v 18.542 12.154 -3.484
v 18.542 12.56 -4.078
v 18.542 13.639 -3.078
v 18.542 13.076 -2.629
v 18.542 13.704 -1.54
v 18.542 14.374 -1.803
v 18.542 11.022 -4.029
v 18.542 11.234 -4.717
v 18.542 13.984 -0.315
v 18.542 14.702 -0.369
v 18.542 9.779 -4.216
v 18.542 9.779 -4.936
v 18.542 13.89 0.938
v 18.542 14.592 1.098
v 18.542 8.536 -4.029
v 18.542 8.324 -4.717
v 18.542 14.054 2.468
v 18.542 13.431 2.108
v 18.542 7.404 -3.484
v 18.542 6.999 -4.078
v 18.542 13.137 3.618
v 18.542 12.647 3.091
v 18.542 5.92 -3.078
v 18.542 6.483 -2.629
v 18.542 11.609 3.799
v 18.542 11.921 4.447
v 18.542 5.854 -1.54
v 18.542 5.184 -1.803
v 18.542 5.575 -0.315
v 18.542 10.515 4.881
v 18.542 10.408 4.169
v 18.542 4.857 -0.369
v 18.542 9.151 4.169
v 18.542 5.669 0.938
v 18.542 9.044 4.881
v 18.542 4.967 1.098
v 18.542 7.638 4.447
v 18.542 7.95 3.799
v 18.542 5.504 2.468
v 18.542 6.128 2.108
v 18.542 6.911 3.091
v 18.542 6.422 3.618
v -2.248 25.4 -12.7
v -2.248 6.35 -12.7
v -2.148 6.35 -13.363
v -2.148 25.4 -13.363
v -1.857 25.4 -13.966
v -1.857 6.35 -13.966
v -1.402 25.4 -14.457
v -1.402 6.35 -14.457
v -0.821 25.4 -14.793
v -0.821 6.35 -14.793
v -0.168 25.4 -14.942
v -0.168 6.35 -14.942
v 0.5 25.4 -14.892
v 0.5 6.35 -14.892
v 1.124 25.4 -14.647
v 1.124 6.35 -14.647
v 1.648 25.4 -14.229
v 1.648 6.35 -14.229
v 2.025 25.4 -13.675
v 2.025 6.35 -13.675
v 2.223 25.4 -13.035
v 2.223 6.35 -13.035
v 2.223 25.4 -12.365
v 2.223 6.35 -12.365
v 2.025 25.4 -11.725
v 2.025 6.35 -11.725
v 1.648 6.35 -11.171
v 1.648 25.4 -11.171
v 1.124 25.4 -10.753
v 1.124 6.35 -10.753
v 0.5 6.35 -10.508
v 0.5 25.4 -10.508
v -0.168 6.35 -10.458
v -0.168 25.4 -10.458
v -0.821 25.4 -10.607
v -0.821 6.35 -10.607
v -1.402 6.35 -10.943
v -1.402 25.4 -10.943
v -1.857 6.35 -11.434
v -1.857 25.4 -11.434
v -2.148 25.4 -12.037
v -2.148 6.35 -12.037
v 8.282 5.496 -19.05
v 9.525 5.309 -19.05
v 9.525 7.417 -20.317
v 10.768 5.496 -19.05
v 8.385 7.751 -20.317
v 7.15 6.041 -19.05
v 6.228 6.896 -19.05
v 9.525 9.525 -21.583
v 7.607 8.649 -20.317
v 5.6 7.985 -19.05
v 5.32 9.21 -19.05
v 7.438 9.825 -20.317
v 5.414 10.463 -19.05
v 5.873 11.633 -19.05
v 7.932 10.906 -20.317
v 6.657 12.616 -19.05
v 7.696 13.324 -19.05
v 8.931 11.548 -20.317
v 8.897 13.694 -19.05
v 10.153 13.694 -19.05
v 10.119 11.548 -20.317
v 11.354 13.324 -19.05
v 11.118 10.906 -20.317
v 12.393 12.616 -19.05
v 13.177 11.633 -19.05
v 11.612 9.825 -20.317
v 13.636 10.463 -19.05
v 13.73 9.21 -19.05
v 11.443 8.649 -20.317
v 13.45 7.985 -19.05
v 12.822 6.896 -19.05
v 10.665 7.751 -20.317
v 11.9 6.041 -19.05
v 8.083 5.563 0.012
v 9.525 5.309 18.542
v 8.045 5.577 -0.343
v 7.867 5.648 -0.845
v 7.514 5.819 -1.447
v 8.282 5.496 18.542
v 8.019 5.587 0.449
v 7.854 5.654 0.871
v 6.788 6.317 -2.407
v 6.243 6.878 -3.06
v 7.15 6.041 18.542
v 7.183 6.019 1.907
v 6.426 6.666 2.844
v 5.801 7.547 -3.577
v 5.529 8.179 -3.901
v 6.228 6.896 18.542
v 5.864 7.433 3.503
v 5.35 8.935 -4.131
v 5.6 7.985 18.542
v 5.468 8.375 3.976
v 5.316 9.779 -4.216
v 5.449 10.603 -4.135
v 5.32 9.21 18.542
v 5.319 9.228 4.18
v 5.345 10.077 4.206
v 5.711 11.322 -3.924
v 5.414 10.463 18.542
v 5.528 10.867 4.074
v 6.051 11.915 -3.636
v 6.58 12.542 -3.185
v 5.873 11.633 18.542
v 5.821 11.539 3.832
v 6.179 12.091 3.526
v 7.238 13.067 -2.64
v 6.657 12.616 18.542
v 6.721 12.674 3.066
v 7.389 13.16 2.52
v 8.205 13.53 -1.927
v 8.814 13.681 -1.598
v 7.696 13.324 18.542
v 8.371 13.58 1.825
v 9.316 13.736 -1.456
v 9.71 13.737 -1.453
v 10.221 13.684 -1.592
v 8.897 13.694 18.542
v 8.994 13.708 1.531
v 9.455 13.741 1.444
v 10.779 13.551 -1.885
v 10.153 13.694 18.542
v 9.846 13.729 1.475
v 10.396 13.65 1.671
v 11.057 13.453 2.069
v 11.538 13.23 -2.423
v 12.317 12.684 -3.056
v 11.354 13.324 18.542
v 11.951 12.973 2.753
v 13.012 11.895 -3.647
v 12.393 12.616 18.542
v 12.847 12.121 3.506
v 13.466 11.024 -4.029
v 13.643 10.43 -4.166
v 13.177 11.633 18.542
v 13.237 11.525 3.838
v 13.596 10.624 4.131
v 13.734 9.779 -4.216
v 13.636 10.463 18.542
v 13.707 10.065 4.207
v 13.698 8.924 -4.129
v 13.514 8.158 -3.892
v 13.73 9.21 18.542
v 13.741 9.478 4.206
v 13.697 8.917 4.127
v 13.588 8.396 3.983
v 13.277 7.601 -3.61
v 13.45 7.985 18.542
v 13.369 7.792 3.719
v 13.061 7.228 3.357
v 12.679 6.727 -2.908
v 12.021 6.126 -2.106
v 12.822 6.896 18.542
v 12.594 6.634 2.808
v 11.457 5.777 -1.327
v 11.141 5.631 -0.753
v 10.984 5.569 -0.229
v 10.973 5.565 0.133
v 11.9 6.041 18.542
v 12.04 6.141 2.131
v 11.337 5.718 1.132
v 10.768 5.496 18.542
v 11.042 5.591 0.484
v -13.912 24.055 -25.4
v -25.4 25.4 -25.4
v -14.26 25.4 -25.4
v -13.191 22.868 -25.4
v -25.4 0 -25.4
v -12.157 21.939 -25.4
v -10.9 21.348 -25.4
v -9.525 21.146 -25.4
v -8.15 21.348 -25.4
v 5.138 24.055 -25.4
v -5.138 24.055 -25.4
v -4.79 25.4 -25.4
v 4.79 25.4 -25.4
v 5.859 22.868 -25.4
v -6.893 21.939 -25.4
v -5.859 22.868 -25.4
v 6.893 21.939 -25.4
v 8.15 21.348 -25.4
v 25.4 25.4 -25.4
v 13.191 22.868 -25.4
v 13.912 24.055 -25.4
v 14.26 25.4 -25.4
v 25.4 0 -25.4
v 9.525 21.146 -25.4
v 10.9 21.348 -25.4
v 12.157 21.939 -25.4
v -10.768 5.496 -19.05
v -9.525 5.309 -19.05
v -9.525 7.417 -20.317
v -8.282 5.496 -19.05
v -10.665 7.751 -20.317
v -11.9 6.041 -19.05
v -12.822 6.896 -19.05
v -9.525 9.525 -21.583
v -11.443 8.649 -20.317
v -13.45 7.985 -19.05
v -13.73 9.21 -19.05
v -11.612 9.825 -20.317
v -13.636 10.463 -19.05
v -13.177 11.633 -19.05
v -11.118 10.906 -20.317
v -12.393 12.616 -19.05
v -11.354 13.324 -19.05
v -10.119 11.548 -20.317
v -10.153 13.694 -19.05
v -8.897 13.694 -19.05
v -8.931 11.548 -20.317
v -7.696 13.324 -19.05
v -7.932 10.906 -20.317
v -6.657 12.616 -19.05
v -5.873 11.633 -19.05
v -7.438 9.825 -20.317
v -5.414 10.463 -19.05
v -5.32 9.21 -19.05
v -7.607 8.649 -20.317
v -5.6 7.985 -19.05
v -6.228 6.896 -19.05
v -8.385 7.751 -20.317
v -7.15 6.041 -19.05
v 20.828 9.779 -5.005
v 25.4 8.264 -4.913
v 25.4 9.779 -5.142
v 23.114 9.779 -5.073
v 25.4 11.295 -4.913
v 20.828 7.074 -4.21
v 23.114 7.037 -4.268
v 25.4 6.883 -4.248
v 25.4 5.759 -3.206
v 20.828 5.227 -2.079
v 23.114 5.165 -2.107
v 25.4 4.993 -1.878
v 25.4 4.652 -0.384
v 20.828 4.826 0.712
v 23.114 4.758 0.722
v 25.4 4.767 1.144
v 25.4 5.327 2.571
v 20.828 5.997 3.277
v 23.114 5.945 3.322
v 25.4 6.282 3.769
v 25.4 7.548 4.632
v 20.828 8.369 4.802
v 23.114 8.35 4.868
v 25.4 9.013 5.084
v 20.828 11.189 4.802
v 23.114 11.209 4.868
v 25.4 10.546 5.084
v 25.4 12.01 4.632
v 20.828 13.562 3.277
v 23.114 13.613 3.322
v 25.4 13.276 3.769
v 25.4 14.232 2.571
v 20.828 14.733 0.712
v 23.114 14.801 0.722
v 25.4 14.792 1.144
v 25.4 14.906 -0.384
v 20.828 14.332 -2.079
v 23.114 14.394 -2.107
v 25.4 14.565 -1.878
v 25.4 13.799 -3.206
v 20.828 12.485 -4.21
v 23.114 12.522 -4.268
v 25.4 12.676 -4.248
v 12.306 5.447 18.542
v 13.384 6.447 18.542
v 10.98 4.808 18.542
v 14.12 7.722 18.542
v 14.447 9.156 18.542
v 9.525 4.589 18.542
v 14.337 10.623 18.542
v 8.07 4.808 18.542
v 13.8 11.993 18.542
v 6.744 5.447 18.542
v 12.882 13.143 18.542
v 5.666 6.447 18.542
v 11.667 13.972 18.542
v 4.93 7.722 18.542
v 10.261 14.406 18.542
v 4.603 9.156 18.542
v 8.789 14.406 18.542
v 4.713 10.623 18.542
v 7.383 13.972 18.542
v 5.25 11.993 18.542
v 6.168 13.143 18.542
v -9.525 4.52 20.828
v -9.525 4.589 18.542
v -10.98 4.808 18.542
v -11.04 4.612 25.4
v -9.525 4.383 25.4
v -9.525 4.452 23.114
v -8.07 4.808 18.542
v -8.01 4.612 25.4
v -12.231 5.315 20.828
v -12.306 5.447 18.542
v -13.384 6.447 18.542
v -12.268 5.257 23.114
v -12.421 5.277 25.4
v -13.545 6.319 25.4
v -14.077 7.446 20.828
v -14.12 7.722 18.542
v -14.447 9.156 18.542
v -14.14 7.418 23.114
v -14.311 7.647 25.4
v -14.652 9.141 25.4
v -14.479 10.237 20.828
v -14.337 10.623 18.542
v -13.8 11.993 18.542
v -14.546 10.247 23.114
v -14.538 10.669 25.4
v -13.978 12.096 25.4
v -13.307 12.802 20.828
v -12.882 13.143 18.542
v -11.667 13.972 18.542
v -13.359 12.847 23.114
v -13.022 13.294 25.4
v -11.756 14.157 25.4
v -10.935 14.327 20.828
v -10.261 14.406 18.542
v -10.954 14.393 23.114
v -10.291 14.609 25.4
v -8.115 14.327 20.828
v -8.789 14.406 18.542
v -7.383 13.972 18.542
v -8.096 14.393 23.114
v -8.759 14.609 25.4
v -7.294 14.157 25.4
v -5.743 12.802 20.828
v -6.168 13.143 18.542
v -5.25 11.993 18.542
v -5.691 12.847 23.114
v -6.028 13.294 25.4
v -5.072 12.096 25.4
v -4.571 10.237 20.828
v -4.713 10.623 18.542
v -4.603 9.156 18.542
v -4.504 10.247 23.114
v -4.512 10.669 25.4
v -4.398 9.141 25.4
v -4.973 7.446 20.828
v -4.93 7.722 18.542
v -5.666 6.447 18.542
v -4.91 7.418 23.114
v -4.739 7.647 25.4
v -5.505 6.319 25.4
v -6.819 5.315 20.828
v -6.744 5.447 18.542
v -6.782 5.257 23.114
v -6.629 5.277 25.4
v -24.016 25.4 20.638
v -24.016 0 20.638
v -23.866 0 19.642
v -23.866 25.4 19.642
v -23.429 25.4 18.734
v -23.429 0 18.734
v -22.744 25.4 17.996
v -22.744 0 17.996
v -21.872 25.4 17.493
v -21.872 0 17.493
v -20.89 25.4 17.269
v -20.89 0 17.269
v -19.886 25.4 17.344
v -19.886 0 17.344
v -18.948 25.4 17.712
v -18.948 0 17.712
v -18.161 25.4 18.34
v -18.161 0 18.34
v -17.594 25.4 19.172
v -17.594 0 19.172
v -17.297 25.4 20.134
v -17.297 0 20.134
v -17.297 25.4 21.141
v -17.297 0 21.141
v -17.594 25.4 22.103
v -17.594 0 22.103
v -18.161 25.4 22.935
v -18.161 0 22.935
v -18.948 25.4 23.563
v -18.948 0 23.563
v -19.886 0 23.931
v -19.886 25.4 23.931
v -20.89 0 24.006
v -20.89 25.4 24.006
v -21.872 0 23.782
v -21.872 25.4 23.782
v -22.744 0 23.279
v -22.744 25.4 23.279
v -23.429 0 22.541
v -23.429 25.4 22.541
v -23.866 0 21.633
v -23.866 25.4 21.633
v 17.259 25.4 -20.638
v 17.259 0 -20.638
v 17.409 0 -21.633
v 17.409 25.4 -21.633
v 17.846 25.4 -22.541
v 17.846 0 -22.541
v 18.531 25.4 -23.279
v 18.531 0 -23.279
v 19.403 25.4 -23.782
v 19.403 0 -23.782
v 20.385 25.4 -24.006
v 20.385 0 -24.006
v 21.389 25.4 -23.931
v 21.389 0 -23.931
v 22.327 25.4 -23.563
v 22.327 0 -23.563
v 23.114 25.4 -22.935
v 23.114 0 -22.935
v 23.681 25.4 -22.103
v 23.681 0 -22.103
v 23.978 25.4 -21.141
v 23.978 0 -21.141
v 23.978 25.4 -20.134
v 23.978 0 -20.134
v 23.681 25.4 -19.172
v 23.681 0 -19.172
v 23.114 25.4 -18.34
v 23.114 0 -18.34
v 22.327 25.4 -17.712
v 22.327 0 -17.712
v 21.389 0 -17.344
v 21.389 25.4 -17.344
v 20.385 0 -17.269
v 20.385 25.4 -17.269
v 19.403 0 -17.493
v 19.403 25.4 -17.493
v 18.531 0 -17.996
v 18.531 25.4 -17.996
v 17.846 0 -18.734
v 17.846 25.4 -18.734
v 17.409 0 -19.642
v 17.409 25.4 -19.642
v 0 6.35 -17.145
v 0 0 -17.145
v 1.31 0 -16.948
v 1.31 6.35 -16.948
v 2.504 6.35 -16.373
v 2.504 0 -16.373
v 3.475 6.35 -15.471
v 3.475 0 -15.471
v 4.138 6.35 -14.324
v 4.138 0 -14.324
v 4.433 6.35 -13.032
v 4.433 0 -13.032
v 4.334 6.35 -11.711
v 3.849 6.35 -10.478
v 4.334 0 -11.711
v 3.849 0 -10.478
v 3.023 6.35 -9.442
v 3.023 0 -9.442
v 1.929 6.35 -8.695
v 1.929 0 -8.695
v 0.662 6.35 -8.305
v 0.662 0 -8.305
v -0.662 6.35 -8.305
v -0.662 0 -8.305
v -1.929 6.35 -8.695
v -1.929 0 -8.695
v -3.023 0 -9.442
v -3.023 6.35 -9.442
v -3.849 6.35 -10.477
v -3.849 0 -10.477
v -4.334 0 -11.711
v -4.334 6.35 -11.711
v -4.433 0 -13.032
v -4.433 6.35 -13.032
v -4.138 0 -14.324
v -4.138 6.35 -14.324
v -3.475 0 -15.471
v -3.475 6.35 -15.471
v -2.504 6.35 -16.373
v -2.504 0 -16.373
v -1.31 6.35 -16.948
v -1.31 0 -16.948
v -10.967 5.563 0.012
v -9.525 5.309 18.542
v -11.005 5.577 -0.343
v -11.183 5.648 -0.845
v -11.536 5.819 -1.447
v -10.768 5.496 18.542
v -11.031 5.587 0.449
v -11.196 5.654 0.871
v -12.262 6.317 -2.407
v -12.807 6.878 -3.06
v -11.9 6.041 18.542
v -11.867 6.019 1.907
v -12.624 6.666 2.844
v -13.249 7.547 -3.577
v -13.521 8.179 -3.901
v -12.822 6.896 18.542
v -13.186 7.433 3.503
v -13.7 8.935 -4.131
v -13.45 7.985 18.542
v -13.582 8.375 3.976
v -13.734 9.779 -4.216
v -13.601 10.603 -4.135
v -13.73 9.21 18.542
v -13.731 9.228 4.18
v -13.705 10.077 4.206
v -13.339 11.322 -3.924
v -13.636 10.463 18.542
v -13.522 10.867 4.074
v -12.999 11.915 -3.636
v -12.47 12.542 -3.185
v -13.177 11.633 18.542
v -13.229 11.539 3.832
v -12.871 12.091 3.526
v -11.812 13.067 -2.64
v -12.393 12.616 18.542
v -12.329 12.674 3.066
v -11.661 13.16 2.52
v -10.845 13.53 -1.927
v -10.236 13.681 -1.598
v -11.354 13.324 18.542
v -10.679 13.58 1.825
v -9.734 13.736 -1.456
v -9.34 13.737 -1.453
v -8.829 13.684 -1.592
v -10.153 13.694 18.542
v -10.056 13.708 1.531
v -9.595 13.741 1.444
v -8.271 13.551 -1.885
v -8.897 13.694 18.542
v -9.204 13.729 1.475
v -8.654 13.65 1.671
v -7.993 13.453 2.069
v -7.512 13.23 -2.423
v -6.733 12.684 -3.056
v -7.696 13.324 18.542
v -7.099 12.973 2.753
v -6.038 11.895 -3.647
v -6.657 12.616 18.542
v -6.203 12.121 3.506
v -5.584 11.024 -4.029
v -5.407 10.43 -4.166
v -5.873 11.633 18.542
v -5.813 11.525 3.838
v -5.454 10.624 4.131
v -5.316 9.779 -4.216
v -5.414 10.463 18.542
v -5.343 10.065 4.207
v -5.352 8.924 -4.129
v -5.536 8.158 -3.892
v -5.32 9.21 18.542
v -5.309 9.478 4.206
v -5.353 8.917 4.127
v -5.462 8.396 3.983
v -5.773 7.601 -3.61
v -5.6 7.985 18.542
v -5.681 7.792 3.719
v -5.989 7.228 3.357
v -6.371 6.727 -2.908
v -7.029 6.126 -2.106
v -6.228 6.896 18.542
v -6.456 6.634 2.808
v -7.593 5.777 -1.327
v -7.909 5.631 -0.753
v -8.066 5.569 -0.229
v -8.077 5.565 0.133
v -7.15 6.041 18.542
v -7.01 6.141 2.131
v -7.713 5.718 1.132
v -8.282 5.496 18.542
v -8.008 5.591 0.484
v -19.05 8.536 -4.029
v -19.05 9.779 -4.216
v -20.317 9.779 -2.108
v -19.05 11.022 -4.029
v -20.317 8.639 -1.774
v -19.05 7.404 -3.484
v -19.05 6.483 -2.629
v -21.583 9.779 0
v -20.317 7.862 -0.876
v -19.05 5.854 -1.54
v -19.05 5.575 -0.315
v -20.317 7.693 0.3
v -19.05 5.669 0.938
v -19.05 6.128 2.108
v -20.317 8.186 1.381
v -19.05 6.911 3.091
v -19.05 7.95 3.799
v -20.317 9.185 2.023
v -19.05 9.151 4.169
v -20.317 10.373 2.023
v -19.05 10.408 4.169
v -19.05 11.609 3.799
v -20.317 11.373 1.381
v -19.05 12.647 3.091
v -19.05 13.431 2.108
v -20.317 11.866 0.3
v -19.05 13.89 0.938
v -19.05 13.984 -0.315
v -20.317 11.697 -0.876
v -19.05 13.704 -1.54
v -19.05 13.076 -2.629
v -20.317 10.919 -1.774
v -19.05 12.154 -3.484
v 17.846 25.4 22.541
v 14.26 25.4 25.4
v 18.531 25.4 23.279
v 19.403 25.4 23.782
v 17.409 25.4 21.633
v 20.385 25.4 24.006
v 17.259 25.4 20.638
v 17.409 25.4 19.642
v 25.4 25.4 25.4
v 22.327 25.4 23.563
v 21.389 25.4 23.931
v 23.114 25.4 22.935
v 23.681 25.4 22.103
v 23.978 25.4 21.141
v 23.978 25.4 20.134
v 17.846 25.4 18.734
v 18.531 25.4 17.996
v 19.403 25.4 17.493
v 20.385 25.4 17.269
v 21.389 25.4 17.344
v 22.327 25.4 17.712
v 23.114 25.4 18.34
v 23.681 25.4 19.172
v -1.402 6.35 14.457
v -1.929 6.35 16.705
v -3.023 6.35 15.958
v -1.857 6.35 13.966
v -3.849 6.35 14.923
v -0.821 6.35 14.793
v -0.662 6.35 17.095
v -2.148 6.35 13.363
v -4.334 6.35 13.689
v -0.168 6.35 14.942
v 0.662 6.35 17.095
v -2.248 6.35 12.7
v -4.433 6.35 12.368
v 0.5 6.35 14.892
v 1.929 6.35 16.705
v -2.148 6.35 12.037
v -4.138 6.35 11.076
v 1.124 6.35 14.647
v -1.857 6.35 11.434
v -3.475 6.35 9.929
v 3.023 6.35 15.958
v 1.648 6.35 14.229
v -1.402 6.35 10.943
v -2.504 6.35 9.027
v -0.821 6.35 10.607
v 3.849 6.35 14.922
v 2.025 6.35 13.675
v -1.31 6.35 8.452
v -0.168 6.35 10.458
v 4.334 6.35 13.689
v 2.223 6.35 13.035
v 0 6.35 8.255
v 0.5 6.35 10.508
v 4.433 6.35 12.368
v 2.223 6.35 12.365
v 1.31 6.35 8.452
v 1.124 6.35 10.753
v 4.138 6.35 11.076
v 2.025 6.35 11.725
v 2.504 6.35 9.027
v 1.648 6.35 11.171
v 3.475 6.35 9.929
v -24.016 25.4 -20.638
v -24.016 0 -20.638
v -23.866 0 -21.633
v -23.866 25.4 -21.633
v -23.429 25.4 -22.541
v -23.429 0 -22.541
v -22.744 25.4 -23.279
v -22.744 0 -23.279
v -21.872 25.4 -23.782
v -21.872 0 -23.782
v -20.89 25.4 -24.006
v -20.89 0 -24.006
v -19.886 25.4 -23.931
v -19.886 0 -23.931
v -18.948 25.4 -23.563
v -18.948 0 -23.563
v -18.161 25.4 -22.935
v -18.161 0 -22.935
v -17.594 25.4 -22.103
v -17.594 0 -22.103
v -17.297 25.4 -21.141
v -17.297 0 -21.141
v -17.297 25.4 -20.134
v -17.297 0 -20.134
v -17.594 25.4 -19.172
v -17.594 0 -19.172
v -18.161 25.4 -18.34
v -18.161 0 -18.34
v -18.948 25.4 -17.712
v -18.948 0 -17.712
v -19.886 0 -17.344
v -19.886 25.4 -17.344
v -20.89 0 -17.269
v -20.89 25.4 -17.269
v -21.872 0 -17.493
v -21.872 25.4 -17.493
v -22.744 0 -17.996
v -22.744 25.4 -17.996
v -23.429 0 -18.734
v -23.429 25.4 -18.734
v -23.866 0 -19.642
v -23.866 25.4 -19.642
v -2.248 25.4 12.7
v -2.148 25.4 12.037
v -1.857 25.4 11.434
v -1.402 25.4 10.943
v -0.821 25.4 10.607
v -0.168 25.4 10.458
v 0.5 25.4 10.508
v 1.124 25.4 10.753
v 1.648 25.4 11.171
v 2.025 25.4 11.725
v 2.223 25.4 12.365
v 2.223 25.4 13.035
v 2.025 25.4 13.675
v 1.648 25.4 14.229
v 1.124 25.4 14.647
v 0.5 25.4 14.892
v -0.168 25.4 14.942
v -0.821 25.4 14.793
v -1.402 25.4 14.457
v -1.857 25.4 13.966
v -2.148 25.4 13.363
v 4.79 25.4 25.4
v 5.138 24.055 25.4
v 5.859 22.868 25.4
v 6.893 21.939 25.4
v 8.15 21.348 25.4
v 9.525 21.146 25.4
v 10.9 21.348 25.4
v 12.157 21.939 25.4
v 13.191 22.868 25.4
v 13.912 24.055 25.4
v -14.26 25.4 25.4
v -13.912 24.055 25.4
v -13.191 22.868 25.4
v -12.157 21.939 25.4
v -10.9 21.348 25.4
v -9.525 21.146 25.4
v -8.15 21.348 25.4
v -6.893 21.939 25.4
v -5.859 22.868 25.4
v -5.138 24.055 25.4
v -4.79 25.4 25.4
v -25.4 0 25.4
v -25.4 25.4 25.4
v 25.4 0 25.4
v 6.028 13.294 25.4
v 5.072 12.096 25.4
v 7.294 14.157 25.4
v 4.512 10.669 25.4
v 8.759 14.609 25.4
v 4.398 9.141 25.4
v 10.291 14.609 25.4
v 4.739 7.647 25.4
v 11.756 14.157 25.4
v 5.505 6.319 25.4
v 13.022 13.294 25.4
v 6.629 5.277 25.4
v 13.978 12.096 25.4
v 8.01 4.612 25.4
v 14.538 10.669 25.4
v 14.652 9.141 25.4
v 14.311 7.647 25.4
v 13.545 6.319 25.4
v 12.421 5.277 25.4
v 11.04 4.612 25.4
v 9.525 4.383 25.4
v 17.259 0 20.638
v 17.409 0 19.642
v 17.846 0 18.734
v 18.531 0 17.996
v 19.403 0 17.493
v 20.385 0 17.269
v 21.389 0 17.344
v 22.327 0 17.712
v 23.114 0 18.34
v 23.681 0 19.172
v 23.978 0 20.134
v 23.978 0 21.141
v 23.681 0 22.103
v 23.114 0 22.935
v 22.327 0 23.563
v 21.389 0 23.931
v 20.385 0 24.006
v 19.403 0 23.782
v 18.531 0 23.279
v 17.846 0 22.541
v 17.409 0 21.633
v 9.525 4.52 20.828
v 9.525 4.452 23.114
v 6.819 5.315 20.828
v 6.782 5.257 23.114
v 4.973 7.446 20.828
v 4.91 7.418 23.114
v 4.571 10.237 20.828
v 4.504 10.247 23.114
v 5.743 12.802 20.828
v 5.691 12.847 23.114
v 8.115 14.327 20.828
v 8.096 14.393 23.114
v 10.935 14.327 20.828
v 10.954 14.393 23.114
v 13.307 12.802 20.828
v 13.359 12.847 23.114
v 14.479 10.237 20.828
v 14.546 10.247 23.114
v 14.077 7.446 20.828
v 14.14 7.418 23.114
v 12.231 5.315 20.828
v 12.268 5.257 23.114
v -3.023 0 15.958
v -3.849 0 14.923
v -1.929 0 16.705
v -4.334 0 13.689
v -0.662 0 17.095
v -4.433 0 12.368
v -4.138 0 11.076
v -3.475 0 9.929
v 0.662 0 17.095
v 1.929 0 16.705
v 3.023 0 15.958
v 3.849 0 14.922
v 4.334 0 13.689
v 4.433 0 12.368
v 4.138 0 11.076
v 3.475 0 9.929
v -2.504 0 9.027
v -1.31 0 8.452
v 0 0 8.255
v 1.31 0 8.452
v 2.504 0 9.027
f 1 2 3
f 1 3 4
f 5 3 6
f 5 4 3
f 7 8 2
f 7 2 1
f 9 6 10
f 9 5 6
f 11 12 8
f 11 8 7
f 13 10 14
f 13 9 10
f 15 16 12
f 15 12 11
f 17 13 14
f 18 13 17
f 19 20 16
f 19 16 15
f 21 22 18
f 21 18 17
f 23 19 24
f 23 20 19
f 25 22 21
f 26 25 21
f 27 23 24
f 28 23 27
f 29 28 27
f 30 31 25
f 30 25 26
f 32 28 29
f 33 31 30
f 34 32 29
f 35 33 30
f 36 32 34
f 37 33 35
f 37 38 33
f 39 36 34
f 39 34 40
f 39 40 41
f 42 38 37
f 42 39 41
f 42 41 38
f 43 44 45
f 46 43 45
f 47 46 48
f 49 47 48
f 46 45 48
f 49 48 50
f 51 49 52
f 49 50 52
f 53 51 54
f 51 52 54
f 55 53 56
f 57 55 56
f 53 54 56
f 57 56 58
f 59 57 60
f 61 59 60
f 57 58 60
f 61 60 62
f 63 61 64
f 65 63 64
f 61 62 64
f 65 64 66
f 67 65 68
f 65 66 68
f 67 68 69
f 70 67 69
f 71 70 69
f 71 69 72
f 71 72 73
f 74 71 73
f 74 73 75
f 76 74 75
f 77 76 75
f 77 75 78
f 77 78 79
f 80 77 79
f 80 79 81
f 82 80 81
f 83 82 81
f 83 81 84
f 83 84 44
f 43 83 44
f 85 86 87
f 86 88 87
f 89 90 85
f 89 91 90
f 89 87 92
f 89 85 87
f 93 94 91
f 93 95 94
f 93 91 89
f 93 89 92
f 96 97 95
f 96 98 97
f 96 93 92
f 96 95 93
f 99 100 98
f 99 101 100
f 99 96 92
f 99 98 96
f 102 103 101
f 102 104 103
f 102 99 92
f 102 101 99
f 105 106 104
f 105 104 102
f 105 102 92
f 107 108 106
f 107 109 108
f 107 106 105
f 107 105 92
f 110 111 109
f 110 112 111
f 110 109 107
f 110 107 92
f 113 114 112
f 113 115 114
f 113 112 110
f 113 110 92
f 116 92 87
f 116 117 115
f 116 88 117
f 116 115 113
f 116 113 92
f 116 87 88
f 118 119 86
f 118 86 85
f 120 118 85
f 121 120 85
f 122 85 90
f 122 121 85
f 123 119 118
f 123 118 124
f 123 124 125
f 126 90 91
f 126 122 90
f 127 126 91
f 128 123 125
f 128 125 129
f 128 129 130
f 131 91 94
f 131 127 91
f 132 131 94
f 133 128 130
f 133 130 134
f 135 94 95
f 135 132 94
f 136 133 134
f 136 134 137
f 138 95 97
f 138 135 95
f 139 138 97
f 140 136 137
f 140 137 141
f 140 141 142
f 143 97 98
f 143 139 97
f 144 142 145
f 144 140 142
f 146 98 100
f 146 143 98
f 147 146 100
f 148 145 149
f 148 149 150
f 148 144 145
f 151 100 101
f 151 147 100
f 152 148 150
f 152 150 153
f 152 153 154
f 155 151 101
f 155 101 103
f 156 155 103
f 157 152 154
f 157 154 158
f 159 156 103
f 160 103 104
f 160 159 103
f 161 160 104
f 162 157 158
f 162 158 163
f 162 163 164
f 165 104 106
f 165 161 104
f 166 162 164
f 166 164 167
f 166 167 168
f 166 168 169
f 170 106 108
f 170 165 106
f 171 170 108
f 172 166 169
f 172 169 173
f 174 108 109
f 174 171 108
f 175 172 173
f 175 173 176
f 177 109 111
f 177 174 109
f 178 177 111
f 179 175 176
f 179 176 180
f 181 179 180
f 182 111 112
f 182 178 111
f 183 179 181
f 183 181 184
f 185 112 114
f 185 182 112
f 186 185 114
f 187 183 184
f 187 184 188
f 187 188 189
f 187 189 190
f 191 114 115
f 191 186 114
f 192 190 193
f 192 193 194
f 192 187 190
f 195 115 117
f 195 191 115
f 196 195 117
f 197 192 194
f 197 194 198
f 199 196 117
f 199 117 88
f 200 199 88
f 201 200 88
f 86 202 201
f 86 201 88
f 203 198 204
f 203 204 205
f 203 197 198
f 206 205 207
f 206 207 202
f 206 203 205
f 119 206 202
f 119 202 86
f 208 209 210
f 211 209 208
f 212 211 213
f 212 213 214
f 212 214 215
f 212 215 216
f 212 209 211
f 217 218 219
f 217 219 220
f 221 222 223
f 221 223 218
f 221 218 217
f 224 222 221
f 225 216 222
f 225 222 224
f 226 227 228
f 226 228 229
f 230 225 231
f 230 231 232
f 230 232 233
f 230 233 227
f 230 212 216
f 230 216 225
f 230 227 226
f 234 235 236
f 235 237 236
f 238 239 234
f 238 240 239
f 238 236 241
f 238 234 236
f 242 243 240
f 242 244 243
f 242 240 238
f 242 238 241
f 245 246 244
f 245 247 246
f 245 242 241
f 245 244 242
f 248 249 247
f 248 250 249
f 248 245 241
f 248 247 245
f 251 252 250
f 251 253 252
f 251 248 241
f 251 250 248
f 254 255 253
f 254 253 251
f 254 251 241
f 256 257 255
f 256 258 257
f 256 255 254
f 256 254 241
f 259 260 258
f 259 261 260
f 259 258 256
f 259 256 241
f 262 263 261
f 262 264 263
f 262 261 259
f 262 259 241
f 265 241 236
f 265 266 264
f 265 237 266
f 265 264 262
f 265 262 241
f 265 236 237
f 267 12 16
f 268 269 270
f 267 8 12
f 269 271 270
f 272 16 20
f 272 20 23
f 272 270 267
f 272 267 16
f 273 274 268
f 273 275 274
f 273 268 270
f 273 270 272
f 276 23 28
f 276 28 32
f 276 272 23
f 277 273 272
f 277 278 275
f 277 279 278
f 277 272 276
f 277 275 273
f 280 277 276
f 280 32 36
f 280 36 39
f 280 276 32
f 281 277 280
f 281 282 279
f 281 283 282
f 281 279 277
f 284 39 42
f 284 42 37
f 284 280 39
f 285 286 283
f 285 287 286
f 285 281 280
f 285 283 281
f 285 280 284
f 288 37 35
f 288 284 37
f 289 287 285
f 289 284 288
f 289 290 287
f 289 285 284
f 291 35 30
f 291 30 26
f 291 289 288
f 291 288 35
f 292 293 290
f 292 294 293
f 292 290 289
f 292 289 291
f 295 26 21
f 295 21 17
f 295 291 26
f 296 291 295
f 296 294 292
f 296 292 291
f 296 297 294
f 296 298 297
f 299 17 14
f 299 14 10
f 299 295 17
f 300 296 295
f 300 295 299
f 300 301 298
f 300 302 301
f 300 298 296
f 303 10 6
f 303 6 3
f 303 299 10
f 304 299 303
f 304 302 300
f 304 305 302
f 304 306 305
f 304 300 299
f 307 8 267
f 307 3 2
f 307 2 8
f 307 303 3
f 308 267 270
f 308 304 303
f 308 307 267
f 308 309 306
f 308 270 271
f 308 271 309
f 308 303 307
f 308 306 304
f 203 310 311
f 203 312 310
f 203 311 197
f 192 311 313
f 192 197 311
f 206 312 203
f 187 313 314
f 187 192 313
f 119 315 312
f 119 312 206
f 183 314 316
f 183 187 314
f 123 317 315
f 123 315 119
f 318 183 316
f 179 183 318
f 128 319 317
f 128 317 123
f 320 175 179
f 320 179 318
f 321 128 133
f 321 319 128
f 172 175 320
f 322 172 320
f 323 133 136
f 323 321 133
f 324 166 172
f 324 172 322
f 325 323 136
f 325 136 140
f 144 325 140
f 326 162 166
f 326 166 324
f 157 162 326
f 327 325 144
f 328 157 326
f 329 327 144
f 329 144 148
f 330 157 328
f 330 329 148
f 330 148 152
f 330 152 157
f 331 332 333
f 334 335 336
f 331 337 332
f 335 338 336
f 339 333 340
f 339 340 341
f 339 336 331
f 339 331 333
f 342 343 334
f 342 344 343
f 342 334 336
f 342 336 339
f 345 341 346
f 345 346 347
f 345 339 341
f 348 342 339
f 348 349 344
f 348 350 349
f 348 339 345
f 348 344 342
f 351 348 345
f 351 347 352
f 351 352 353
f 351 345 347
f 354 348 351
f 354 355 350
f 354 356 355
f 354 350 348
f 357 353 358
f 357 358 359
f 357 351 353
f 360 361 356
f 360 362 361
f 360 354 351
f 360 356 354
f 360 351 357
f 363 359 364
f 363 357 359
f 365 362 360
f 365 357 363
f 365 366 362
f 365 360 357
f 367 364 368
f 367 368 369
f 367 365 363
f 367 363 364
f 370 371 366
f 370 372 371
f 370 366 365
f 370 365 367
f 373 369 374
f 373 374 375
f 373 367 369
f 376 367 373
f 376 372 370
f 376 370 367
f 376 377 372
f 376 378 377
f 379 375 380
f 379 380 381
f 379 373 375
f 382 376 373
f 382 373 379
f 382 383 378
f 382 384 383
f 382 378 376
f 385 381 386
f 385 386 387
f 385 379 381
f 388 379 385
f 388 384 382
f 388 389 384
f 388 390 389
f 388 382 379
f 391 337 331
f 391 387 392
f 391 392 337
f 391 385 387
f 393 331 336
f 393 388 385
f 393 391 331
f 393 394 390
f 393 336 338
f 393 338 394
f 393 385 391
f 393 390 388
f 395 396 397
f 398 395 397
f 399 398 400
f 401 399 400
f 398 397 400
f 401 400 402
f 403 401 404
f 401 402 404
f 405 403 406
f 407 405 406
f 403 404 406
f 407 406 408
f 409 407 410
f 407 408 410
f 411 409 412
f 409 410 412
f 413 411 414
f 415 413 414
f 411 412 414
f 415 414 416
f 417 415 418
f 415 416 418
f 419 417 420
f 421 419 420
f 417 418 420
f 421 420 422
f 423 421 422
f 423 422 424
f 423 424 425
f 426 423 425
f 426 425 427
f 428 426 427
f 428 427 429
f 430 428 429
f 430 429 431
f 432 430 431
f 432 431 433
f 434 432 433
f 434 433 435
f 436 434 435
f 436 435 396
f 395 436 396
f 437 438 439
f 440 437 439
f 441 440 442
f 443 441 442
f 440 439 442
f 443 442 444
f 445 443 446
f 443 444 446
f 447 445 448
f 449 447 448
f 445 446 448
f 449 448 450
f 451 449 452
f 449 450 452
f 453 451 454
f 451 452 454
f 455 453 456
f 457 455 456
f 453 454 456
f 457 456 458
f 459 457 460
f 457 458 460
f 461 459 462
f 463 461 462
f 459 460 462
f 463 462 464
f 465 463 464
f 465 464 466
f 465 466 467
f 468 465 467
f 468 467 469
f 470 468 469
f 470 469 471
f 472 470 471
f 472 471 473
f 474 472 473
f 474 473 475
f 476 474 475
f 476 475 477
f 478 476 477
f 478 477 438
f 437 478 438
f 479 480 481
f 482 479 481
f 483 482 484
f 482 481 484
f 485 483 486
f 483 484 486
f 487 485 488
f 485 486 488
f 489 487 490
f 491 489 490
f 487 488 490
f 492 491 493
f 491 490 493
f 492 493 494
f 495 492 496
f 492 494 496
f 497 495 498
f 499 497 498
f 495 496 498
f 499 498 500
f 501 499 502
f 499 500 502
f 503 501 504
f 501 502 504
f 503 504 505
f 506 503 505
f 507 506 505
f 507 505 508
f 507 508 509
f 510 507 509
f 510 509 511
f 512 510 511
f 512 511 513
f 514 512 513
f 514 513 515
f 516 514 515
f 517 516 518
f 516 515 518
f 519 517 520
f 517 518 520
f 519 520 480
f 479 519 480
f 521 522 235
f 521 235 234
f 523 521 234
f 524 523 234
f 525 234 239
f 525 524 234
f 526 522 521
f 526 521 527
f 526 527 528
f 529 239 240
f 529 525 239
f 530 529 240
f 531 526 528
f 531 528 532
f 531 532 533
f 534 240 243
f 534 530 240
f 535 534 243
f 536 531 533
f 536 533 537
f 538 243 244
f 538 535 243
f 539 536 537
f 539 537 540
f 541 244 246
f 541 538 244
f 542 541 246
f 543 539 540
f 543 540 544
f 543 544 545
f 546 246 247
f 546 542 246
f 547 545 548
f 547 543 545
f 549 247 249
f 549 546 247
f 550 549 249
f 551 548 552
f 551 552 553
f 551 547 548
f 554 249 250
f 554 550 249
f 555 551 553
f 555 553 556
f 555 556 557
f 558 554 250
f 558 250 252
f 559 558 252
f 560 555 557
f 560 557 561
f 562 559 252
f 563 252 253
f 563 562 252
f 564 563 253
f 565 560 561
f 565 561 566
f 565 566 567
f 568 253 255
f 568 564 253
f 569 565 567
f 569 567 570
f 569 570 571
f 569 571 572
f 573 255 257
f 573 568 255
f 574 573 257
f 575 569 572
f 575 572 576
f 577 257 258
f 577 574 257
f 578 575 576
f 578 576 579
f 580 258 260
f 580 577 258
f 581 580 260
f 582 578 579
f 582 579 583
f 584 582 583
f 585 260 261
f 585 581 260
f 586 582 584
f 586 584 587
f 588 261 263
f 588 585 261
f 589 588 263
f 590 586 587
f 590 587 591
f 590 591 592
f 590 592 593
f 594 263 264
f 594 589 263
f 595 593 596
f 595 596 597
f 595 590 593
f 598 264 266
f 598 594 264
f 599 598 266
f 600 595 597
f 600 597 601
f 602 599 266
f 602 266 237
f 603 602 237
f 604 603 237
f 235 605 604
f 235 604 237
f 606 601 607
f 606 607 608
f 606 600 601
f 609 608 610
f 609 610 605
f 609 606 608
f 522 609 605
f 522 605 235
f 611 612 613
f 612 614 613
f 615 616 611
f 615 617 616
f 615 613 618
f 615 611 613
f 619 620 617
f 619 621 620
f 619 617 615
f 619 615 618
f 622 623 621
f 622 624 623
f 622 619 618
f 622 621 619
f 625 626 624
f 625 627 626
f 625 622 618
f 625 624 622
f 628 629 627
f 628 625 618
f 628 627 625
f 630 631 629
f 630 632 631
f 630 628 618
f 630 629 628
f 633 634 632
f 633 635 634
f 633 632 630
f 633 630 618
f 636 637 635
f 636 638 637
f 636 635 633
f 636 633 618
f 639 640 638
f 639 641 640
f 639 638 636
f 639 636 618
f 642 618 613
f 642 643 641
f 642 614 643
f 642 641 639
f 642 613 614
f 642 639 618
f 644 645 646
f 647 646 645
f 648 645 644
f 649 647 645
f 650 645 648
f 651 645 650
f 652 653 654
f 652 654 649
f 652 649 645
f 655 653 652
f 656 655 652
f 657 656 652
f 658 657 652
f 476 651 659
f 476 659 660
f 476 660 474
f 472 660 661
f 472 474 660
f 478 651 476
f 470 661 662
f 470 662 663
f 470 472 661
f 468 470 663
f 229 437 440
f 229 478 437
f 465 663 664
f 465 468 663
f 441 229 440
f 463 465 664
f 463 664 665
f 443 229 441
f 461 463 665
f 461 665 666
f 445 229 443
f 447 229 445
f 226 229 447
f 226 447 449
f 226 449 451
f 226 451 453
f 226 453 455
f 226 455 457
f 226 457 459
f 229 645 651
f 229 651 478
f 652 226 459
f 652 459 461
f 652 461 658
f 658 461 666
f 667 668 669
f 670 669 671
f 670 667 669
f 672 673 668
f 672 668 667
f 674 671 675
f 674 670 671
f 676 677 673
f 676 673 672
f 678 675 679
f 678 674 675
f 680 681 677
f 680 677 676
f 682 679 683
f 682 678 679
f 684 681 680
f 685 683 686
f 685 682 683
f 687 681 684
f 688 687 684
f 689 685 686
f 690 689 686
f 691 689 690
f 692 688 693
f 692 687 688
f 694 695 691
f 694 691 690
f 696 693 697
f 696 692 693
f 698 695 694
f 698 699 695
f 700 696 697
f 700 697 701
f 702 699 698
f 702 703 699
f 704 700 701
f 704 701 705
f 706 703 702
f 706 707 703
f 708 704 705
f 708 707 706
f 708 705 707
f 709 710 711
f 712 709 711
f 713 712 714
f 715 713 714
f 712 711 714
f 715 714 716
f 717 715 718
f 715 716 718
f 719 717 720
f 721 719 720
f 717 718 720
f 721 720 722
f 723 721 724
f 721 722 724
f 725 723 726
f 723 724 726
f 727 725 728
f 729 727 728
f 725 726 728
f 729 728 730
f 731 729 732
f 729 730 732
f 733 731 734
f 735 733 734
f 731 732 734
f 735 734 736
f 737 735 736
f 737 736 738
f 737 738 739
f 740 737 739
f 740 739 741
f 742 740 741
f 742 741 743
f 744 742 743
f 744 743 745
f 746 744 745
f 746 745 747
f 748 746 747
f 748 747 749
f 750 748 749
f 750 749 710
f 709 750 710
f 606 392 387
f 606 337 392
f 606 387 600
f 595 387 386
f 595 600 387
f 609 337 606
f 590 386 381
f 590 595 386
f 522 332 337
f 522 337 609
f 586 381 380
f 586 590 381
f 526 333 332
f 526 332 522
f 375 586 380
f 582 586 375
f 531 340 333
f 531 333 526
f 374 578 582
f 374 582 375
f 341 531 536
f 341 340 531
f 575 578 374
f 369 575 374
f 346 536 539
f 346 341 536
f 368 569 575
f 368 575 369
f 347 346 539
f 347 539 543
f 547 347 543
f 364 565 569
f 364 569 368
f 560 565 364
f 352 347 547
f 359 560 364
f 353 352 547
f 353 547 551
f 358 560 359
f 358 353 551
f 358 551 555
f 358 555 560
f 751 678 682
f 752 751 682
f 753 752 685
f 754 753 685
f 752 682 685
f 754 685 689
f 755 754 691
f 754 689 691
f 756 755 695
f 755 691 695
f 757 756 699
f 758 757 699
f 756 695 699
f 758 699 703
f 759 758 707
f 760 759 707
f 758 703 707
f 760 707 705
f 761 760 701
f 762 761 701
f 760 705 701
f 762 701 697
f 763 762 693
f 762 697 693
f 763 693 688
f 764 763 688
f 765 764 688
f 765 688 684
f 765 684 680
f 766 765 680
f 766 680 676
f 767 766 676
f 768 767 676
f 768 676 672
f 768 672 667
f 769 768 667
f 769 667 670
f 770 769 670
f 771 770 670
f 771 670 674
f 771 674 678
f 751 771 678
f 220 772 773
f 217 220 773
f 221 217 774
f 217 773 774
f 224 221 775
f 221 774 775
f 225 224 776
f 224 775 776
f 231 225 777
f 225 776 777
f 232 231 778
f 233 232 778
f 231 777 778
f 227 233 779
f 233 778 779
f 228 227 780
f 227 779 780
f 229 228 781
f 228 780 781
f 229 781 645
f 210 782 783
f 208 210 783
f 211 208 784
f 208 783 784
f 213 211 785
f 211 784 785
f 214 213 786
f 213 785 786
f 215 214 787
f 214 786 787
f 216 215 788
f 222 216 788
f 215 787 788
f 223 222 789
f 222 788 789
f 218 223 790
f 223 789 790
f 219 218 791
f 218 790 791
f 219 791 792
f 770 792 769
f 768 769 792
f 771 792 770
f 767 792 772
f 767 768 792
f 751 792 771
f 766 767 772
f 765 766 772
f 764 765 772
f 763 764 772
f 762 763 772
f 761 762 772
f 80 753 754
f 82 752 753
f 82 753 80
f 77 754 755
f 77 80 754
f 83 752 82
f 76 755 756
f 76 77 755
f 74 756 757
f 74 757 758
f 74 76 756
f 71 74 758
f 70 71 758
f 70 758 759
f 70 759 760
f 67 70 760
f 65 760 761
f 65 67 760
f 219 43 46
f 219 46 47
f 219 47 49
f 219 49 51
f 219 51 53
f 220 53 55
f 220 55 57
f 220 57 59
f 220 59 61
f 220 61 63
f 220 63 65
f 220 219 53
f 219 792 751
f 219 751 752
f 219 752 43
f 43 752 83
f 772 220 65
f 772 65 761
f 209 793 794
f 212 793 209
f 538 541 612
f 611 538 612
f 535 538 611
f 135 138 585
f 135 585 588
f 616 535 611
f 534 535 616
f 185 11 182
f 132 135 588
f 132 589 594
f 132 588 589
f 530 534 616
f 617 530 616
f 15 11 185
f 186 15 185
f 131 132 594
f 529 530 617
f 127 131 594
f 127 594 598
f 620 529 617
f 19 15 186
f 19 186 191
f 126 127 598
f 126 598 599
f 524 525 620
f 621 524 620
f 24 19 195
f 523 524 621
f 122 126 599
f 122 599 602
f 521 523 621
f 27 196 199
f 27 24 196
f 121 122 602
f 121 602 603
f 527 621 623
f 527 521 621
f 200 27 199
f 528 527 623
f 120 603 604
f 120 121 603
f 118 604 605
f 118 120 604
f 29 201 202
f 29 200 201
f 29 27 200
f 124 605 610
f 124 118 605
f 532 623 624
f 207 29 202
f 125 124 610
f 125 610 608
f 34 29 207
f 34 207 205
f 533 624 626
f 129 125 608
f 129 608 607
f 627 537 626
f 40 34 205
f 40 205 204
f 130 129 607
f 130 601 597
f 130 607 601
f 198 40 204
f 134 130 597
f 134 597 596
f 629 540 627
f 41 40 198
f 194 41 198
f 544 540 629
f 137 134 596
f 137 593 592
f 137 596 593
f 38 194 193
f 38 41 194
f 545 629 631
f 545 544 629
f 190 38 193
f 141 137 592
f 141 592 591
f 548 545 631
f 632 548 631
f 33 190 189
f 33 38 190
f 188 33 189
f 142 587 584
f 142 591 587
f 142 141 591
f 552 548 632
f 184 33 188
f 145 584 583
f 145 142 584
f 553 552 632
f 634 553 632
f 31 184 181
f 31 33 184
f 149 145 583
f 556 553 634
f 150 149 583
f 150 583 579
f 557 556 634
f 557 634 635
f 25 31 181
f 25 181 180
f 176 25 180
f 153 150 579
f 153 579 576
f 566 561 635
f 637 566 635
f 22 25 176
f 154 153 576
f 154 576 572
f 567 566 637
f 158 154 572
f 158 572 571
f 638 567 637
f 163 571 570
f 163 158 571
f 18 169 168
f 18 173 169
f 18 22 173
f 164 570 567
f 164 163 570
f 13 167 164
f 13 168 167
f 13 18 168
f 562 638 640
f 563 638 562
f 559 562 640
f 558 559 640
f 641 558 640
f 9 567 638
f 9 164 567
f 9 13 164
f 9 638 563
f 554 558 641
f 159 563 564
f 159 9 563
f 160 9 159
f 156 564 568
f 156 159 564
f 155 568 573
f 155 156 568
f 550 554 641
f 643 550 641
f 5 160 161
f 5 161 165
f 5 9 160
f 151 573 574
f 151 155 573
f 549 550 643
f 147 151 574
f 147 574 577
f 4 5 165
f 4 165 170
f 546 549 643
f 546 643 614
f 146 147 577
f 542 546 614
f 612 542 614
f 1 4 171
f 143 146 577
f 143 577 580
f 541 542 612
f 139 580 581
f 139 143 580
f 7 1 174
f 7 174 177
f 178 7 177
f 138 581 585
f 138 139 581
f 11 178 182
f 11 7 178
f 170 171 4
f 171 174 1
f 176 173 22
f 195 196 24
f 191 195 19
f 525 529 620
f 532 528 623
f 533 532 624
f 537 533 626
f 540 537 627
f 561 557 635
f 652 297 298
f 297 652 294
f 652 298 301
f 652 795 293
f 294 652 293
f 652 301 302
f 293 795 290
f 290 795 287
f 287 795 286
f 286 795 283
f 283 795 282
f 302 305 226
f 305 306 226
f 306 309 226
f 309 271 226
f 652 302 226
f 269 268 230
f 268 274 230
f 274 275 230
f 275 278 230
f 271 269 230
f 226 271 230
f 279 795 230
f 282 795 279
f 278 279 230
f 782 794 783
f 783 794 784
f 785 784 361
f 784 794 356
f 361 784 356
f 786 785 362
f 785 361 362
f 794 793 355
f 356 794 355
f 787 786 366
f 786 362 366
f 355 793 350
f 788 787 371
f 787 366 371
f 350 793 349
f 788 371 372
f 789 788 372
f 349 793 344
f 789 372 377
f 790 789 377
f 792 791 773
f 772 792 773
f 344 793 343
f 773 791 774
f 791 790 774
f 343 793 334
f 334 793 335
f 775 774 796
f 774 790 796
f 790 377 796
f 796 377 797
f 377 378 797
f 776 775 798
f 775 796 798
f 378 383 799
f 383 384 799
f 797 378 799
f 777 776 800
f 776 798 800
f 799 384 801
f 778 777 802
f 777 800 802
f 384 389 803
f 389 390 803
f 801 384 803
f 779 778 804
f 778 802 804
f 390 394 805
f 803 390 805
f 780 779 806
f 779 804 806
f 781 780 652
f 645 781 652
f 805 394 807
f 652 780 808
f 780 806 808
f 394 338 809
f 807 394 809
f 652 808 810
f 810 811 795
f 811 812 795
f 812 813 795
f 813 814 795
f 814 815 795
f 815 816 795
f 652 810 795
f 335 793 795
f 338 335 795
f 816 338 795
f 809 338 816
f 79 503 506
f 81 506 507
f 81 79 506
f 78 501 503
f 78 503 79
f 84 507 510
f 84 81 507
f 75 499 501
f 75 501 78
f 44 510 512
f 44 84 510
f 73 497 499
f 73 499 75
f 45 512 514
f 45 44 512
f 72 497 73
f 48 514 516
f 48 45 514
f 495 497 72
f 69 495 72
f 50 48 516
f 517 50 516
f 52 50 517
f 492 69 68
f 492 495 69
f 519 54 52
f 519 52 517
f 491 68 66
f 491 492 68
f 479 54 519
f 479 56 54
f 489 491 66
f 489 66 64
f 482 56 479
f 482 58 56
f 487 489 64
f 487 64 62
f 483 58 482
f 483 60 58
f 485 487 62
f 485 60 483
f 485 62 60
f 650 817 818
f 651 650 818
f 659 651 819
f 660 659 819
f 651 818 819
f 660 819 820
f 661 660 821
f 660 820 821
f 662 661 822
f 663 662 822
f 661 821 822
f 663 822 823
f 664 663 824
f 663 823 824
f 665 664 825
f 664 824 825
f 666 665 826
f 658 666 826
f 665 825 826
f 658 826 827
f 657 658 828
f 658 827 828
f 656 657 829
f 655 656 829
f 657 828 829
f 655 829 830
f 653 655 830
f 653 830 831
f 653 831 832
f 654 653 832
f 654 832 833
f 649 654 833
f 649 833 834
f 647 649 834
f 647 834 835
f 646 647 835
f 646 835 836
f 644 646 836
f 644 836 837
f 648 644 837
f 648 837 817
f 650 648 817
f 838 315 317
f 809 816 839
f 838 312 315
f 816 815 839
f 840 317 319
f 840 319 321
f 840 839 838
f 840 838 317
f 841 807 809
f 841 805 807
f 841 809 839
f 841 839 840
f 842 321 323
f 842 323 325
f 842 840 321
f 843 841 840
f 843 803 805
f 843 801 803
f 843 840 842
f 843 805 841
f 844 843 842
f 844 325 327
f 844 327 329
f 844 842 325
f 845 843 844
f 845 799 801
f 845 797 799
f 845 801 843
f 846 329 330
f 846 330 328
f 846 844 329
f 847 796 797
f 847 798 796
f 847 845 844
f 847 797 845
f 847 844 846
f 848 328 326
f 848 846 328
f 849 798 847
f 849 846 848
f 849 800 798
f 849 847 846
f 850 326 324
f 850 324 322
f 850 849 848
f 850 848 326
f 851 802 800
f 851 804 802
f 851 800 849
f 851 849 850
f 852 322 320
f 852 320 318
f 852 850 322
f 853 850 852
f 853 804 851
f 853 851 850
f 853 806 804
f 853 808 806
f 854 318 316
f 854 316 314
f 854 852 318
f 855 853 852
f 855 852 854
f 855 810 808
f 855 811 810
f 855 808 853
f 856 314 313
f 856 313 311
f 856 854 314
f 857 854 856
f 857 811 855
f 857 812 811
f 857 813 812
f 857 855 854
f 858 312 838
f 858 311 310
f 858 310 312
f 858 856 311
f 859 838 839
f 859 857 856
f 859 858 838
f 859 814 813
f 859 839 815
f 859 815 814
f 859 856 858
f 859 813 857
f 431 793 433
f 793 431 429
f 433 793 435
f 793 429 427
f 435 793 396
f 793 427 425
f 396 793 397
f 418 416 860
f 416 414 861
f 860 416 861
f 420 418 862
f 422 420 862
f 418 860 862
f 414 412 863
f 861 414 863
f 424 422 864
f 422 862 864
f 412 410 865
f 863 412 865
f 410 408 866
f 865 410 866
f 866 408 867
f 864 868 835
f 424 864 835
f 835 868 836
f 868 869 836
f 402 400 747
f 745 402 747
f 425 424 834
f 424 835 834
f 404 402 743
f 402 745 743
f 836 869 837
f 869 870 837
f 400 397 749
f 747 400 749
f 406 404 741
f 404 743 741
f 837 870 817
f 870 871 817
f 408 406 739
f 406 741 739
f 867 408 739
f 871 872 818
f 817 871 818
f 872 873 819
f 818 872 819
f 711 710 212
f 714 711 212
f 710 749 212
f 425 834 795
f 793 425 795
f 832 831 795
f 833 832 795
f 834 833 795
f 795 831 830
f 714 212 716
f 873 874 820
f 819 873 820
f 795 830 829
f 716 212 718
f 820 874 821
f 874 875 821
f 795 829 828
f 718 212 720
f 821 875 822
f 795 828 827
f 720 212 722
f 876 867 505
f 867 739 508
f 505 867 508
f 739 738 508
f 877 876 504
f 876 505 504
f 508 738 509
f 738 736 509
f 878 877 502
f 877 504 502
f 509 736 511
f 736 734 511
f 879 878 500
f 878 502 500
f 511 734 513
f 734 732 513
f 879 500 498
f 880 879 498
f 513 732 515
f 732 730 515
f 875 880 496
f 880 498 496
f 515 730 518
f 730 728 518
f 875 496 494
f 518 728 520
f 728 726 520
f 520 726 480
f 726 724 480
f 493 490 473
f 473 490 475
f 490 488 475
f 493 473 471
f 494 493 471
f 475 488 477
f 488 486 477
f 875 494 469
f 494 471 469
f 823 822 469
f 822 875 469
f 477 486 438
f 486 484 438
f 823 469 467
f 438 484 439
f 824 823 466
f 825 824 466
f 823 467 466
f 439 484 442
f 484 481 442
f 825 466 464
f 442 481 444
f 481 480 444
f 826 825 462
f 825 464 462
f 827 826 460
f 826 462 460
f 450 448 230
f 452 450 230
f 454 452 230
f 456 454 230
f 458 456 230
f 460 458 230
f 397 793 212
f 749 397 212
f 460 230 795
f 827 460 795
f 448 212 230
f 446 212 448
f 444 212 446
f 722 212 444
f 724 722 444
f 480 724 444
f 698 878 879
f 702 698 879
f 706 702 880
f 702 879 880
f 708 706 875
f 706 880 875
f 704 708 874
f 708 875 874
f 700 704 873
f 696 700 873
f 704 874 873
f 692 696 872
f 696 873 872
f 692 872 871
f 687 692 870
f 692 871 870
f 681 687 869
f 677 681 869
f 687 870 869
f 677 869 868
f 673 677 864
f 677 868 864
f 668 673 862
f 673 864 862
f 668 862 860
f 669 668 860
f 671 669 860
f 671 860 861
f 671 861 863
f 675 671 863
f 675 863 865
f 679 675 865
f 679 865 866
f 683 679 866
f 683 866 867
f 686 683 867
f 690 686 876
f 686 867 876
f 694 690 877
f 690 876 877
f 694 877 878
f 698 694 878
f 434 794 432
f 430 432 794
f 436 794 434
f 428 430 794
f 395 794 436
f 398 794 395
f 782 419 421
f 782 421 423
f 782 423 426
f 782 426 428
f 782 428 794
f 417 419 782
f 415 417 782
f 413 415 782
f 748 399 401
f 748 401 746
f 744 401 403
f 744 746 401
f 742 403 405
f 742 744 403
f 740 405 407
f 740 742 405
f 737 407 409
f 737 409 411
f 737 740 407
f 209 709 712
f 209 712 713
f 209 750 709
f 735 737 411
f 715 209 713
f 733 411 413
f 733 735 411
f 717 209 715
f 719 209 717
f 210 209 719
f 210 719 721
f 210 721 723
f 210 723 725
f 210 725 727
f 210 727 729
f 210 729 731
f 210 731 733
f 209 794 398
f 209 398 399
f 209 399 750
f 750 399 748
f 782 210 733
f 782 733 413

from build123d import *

# Parameters (mm, degrees)
SKETCH1_W                         = 50.8
SKETCH1_H                         = 50.8
BOSS_EXTRUDE1_DEPTH               = 25.4
SKETCH2_R                         = 4.7625
CUT_EXTRUDE1_DEPTH                = 63.217039467
F_1_4_CLEARANCE_HOLE1_D           = 6.7564
F_8_CLEARANCE_HOLE1_D             = 4.4958
SKETCH9_R                         = 4.445
CUT_EXTRUDE3_DEPTH                = 6.35
F_1_8_NPT_TAPPED_HOLE1_AT_2_COUNT = 2
F_1_8_NPT_TAPPED_HOLE1_AT_2_PITCH = 19.05


with BuildPart() as part:
    # Sketch1 → Boss-Extrude1 (new body)
    with BuildSketch(Plane(origin=(0, 0, 0), x_dir=(1, 0, 0), z_dir=(0, 1, 0))):
        Rectangle(SKETCH1_W, SKETCH1_H)
    extrude(amount=BOSS_EXTRUDE1_DEPTH)

    # Sketch2 → Cut-Extrude1 (cut, through all)
    with BuildSketch(Plane.XY.offset(25.4)):
        with Locations((-9.525, 25.908)):
            Circle(SKETCH2_R)
        with Locations((9.525, 25.908)):
            Circle(SKETCH2_R)
    extrude(amount=-CUT_EXTRUDE1_DEPTH, mode=Mode.SUBTRACT)

    # 1/4 Clearance Hole1 (through all)
    with Locations(Plane(origin=(0, 25.4, 0), x_dir=(1, 0, 0), z_dir=(0, 1, 0))):
        with Locations((-20.6375, 20.6375), (-20.6375, -20.6375), (20.6375, -20.6375), (20.6375, 20.6375)):
            Hole(F_1_4_CLEARANCE_HOLE1_D / 2)

    # #8 Clearance Hole1 (through all)
    with Locations(Plane(origin=(0, 25.4, 0), x_dir=(1, 0, 0), z_dir=(0, 1, 0))):
        with Locations((0, 12.7), (0, -12.7)):
            Hole(F_8_CLEARANCE_HOLE1_D / 2)

    # Sketch9 → Cut-Extrude3 (cut)
    with BuildSketch(Plane.XZ):
        with Locations(Location((0, 12.7, 0), (0, 0, 270))):
            Circle(SKETCH9_R)
        with Locations(Location((0, -12.7, 0), (0, 0, 270))):
            Circle(SKETCH9_R)
    extrude(amount=-CUT_EXTRUDE3_DEPTH, mode=Mode.SUBTRACT)

    # Sketch10 → 1/8 NPT Tapped Hole1 (revolve, cut)
    with BuildSketch(Plane(origin=(-9.525, 9.525, 25.4), x_dir=(0, -1, 0), z_dir=(1, 0, 0))):
        Polygon((0, 0), (0, 46.983468714), (4.2164, 44.45), (4.2164, 6.858), (4.936181096, 6.858), (5.1415188, 0), align=None)
    f_1_8_npt_tapped_hole1 = revolve(axis=Axis((-9.525, 9.525, 31.75), (0, 0, -1)), mode=Mode.SUBTRACT)

    # 1/8 NPT Tapped Hole1 at 2: 1/8 NPT Tapped Hole1 ×2
    with Locations(*[(i * F_1_8_NPT_TAPPED_HOLE1_AT_2_PITCH, 0, 0) for i in range(1, F_1_8_NPT_TAPPED_HOLE1_AT_2_COUNT)]):
        add(f_1_8_npt_tapped_hole1, mode=Mode.SUBTRACT)

    # Sketch14 → 1/8 NPT Tapped Hole3 (revolve, cut)
    with BuildSketch(Plane(origin=(25.4, 9.77926984, 0), x_dir=(0, 0, -1), z_dir=(0, 1, 0))):
        Polygon((0, 0), (0, 46.983468714), (4.2164, 44.45), (4.2164, 6.858), (4.936181096, 6.858), (5.1415188, 0), align=None)
    revolve(axis=Axis((31.75, 9.77926984, 0), (-1, 0, 0)), mode=Mode.SUBTRACT)


solid = part.part
